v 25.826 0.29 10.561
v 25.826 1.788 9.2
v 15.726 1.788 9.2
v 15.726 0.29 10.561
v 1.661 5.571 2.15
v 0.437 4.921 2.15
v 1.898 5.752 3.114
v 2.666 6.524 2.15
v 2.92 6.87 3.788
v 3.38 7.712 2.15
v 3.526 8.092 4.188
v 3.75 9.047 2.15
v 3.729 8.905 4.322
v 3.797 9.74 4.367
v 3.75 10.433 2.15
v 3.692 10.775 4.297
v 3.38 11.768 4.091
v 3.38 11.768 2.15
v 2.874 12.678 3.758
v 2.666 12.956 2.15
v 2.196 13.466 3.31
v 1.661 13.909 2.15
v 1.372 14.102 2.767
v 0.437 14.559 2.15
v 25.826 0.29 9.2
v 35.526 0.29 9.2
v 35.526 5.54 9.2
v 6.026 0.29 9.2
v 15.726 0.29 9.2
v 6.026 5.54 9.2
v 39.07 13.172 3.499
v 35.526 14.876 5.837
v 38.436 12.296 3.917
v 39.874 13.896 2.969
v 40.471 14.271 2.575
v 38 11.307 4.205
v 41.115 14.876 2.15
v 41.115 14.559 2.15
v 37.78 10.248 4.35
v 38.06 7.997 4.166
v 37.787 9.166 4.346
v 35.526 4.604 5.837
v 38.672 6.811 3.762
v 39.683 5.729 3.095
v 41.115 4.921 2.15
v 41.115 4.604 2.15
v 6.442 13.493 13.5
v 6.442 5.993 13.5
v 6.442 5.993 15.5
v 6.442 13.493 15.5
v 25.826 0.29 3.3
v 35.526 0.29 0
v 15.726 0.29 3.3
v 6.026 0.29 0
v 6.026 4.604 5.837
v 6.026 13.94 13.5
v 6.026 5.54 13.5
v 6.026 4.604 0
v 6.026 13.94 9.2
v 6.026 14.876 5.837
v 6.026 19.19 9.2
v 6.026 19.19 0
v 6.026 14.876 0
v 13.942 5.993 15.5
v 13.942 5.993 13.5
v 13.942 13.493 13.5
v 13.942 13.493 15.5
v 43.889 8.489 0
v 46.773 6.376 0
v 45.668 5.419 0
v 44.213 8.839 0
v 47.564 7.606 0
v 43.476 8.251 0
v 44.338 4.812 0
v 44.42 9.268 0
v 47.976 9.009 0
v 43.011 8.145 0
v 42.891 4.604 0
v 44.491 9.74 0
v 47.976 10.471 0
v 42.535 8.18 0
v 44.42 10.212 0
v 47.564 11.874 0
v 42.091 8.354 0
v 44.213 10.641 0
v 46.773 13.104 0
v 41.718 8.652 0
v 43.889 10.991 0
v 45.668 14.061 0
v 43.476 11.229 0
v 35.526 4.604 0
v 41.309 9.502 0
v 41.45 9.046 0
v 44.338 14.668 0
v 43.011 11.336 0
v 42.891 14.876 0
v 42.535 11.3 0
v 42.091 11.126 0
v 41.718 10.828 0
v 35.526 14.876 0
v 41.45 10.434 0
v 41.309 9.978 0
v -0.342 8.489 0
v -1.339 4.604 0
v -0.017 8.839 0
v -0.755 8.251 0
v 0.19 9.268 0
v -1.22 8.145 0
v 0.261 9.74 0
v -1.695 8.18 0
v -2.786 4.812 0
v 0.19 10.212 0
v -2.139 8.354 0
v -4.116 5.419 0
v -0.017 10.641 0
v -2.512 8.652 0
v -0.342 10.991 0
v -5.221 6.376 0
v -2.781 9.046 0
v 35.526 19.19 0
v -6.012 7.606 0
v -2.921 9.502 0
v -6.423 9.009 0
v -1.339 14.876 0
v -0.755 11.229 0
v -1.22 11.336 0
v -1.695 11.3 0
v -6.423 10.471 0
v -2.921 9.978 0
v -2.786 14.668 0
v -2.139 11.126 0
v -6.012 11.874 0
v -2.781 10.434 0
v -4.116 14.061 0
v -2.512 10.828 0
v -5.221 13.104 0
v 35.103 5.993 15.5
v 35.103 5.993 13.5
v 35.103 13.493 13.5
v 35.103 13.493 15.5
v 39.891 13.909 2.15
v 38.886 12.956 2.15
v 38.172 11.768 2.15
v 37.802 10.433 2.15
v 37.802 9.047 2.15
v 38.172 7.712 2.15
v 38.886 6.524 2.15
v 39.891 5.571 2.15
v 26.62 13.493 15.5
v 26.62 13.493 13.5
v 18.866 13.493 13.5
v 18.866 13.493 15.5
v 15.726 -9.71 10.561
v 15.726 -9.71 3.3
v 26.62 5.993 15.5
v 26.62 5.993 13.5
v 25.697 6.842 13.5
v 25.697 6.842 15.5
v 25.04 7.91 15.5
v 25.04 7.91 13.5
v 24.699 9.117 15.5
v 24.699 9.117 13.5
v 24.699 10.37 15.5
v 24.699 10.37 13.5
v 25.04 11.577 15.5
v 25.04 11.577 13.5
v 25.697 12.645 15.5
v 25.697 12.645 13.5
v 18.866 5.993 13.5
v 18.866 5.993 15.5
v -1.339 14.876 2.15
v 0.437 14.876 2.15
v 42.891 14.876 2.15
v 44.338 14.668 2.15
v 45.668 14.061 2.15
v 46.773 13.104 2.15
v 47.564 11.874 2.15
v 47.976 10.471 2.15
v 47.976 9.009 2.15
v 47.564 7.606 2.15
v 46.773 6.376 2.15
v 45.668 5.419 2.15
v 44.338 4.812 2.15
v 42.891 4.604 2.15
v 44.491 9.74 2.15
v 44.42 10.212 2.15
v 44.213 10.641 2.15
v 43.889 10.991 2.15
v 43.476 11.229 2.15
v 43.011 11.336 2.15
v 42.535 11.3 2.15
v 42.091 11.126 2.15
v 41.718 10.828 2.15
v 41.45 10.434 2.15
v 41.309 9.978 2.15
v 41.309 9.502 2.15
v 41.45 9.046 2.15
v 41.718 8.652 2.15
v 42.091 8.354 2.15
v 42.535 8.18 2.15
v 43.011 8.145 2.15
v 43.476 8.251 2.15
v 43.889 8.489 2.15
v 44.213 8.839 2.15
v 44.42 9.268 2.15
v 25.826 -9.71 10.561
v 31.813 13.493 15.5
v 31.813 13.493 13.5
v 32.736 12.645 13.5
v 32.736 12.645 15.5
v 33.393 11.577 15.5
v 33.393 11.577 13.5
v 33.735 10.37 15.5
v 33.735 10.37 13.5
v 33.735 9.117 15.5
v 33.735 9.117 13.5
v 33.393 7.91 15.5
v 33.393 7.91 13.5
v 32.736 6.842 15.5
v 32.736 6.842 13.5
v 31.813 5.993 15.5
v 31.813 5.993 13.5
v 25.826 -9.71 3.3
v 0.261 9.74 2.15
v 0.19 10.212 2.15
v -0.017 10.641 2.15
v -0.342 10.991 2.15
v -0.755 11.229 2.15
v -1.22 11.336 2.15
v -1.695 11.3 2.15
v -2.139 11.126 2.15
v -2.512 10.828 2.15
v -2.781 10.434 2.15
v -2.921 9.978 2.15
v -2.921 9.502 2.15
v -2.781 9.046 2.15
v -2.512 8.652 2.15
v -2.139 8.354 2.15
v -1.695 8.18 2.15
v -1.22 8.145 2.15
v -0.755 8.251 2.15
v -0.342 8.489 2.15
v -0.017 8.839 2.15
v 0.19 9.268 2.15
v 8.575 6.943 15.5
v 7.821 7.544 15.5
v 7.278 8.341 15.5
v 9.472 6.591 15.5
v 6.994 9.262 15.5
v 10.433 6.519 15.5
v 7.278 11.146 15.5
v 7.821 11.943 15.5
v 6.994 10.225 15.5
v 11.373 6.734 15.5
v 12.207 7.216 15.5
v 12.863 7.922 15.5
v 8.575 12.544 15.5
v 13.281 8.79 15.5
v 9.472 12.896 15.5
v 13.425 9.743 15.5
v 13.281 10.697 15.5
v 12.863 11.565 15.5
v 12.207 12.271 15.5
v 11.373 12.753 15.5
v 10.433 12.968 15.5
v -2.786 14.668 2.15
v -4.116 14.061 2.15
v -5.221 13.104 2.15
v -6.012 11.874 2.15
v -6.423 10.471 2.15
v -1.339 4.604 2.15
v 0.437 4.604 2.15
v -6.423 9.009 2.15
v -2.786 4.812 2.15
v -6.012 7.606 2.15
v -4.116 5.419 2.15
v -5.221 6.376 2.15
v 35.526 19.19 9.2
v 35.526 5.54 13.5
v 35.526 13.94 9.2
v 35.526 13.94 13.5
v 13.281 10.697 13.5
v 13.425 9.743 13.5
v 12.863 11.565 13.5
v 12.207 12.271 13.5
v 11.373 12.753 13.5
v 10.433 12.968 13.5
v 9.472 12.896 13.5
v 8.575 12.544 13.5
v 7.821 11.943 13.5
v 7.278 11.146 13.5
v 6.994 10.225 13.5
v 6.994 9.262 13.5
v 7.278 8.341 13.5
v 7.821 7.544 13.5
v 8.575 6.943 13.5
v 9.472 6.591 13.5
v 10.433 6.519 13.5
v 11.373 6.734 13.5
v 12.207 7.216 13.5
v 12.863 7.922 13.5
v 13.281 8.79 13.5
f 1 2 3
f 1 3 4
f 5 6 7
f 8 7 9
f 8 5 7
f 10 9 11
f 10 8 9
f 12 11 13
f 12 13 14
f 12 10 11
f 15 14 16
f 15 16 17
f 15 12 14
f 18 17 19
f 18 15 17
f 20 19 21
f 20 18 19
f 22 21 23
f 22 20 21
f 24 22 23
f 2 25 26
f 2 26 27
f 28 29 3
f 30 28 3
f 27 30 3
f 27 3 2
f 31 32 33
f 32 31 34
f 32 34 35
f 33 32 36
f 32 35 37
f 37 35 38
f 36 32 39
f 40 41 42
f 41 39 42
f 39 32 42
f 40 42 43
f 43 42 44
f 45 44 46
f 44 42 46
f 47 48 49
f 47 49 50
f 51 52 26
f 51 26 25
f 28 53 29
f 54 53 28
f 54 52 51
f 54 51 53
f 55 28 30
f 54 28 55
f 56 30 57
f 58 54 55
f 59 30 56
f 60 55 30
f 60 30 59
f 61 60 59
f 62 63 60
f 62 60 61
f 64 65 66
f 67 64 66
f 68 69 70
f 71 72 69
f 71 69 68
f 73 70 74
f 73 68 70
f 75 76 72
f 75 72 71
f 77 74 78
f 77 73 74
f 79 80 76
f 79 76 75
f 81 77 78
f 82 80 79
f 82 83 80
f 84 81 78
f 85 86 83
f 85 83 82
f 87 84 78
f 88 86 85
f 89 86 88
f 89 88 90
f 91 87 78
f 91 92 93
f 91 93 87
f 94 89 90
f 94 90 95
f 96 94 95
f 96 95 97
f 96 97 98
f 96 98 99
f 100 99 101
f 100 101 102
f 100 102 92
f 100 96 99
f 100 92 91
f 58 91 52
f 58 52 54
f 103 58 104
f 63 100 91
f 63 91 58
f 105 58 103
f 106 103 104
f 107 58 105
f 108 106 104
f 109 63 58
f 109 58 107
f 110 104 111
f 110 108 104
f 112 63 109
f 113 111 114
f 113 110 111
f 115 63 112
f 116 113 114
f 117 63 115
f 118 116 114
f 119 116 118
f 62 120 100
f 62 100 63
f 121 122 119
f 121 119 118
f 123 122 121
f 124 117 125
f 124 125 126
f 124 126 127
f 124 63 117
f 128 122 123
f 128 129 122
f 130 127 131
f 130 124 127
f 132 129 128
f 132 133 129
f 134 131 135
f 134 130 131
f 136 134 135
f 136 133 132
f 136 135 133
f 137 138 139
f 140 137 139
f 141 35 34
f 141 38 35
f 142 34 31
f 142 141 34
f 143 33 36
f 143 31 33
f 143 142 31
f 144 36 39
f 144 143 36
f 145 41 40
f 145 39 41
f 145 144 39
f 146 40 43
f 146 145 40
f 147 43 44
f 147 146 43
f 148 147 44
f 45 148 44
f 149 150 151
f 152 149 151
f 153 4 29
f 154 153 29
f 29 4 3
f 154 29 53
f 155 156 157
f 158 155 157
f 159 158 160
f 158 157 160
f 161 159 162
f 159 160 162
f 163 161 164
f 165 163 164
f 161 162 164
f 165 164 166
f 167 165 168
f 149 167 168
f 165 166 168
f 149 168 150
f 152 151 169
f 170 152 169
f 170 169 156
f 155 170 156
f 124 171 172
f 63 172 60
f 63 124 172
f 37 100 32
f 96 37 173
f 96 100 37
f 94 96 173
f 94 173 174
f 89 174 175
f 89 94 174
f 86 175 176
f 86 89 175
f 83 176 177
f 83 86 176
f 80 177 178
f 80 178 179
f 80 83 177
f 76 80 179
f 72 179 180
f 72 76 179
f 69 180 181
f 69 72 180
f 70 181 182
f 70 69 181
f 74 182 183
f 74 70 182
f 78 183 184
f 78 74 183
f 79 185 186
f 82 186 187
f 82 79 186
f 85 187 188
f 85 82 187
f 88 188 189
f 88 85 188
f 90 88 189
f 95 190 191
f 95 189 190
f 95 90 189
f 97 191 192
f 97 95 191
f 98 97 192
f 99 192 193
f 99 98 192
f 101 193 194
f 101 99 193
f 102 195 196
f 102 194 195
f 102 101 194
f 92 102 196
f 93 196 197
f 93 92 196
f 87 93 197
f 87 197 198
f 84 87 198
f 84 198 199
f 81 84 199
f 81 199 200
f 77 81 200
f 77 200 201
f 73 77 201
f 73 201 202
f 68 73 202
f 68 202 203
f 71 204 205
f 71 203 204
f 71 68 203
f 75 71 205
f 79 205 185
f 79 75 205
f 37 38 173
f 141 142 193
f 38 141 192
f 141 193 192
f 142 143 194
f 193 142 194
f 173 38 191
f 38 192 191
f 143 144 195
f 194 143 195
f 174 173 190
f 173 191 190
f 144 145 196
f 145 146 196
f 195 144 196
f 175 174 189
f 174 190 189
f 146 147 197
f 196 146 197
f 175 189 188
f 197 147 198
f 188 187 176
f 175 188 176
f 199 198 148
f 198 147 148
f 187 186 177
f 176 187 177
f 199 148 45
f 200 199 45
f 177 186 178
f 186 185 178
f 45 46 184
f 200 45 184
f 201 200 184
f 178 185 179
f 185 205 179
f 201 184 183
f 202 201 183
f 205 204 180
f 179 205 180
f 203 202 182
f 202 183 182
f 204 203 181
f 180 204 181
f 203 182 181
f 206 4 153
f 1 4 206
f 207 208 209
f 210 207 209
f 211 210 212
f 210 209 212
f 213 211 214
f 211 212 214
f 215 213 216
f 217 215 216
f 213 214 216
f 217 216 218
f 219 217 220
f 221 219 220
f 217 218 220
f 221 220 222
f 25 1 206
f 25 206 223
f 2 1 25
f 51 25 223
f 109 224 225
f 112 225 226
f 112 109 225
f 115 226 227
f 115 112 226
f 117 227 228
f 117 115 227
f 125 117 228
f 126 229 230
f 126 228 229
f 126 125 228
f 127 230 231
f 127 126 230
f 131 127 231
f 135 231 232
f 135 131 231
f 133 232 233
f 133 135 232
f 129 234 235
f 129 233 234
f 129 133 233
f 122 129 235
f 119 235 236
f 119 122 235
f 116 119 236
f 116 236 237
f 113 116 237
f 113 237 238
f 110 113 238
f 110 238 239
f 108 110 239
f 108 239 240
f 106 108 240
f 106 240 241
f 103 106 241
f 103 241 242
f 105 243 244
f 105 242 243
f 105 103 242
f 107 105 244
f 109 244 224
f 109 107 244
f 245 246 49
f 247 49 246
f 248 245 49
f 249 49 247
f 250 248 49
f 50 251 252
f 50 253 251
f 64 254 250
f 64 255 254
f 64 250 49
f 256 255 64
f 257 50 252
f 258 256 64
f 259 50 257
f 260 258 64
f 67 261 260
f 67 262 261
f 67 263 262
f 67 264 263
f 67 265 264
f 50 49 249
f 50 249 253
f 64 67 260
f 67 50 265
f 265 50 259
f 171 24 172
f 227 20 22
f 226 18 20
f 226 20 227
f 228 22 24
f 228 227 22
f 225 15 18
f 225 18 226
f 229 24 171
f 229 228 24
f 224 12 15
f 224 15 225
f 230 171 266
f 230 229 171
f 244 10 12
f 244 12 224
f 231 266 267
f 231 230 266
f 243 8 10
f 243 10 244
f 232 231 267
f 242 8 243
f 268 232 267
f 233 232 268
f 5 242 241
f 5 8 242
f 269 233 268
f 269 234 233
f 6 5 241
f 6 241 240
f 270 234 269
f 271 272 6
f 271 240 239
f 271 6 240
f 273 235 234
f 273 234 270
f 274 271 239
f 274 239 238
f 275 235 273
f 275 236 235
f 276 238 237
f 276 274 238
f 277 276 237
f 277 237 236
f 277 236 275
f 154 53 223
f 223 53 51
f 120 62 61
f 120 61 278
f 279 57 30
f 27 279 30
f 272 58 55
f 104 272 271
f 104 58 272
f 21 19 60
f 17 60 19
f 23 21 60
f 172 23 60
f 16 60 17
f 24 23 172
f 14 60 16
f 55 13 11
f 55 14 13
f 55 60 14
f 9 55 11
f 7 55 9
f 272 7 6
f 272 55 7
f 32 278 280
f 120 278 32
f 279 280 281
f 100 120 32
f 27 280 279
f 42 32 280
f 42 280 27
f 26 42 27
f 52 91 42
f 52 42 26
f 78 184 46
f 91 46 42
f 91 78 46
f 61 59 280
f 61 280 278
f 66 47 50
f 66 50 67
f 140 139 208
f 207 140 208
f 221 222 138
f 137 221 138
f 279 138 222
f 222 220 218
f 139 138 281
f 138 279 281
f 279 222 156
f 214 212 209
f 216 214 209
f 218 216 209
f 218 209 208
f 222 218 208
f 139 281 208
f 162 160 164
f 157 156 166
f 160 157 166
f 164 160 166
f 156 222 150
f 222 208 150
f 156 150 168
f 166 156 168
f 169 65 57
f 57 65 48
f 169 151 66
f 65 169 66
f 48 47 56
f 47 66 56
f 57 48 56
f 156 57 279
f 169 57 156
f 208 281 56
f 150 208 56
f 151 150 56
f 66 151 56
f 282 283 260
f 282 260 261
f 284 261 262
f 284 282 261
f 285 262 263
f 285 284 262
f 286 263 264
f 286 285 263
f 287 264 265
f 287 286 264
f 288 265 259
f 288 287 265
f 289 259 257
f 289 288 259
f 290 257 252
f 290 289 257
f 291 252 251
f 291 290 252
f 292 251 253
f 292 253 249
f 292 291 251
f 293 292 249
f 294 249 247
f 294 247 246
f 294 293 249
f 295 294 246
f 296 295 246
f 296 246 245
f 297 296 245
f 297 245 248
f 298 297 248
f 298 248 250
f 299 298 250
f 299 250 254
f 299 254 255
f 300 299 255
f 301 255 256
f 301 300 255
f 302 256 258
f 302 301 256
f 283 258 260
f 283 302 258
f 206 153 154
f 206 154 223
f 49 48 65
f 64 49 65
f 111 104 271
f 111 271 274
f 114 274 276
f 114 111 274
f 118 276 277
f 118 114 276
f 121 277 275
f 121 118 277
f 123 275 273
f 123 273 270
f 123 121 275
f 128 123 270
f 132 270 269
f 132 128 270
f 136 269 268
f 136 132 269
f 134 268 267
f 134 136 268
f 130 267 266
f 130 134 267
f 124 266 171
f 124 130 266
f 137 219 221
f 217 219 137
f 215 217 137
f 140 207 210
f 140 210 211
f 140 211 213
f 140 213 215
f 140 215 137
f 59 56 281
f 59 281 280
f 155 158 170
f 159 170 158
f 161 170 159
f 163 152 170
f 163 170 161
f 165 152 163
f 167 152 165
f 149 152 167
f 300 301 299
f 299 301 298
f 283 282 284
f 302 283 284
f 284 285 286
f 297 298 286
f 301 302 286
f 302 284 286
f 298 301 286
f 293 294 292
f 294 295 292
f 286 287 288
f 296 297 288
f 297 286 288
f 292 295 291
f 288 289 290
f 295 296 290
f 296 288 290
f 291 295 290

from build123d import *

# Parameters (mm, degrees)
SKETCH1_R           = 1.6
BOSS_EXTRUDE1_DEPTH = 13.5
CUT_EXTRUDE2_DEPTH  = 54.452572483
SKETCH3_W           = 4.3
SKETCH3_H           = 5.25
CUT_EXTRUDE4_DEPTH  = 54.452572483
SKETCH4_W           = 7.5
SKETCH4_H           = 7.5
SKETCH4_R           = 3.233378309
BOSS_EXTRUDE2_DEPTH = 2
CUT_EXTRUDE6_START  = -7.05
SKETCH5_R           = 5.136449747
CUT_EXTRUDE6_DEPTH  = 7.05
SKETCH6_W           = 10.1
SKETCH6_H           = 7.260831794
BOSS_EXTRUDE3_DEPTH = 10
BOSS_EXTRUDE4_DEPTH = 10.1


with BuildPart() as part:
    # Sketch1 → Boss-Extrude1 (new body)
    with BuildSketch(Plane.XY):
        with BuildLine():
            Line((6.026068185, 19.19002712), (35.526068185, 19.19002712))
            Line((35.526068185, 19.19002712), (35.526068185, 14.876476867))
            Line((35.526068185, 14.876476867), (42.891358492, 14.876476867))
            ThreePointArc((42.891358492, 14.876476867), (48.027808239, 9.74002712), (42.891358492, 4.603577373))
            Line((42.891358492, 4.603577373), (35.526068185, 4.603577373))
            Line((35.526068185, 4.603577373), (35.526068185, 0.29002712))
            Line((35.526068185, 0.29002712), (6.026068185, 0.29002712))
            Line((6.026068185, 0.29002712), (6.026068185, 4.603577373))
            Line((6.026068185, 4.603577373), (-1.339222121, 4.603577373))
            ThreePointArc((-1.339222121, 4.603577373), (-6.475671868, 9.74002712), (-1.339222121, 14.876476867))
            Line((-1.339222121, 14.876476867), (6.026068185, 14.876476867))
            Line((6.026068185, 14.876476867), (6.026068185, 19.19002712))
        make_face()
        with Locations((-1.339222121, 9.74002712)):
            Circle(SKETCH1_R, mode=Mode.SUBTRACT)
        with Locations((42.891358492, 9.74002712)):
            Circle(SKETCH1_R, mode=Mode.SUBTRACT)
    extrude(amount=BOSS_EXTRUDE1_DEPTH)

    # Sketch2 → Cut-Extrude2 (cut, through all)
    with BuildSketch(Plane(origin=(0, 0, 0), x_dir=(1, 0, 0), z_dir=(0, 1, 0))):
        Polygon((-6.475671868, -2.15), (-6.475671868, 0), (-10.044911126, 0), (-10.044911126, -17.049735049), (6.026068185, -17.049735049), (6.026068185, -5.837365249), (0.437350873, -2.15), align=None)
        Polygon((48.027808239, 0), (51.597047497, 0), (51.597047497, -17.049735049), (35.526068185, -17.049735049), (35.526068185, -5.837365249), (41.114785497, -2.15), (48.027808239, -2.15), align=None)
    extrude(amount=CUT_EXTRUDE2_DEPTH, mode=Mode.SUBTRACT)

    # Sketch3 → Cut-Extrude4 (cut, through all)
    with BuildSketch(Plane(origin=(0, 0, 0), x_dir=(0, 0, -1), z_dir=(1, 0, 0))):
        with Locations((-11.35, 16.56502712)):
            Rectangle(SKETCH3_W, SKETCH3_H)
        with Locations((-11.35, 2.91502712)):
            Rectangle(SKETCH3_W, SKETCH3_H)
    extrude(amount=CUT_EXTRUDE4_DEPTH, mode=Mode.SUBTRACT)

    # Sketch4 → Boss-Extrude2 (add)
    # profile 1 of 3: a face of its own
    with BuildSketch(Plane.XY.offset(13.5)):
        with Locations((10.1915125, 9.743497044)):
            Rectangle(SKETCH4_W, SKETCH4_H)
        with Locations((10.1915125, 9.743497044)):
            Circle(SKETCH4_R, mode=Mode.SUBTRACT)
    # profile 2 of 3: a face of its own
    with BuildSketch(Plane.XY.offset(13.5)):
        with BuildLine():
            Line((35.102590636, 13.493497044), (31.813216882, 13.493497044))
            ThreePointArc((31.813216882, 13.493497044), (33.77792813, 9.743497044), (31.813216882, 5.993497044))
            Line((31.813216882, 5.993497044), (35.102590636, 5.993497044))
            Line((35.102590636, 5.993497044), (35.102590636, 13.493497044))
        make_face()
    # profile 3 of 3: a face of its own
    with BuildSketch(Plane.XY.offset(13.5)):
        with BuildLine():
            Line((18.865933267, 13.493497044), (18.865933267, 5.993497044))
            Line((18.865933267, 5.993497044), (26.620387797, 5.993497044))
            ThreePointArc((26.620387797, 5.993497044), (24.655676549, 9.743497044), (26.620387797, 13.493497044))
            Line((26.620387797, 13.493497044), (18.865933267, 13.493497044))
        make_face()
    extrude(amount=BOSS_EXTRUDE2_DEPTH)

    # Sketch5 → Cut-Extrude6 (cut)
    with BuildSketch(Plane.XY.offset(9.2).offset(CUT_EXTRUDE6_START)):
        with Locations((-1.339222121, 9.74002712)):
            Circle(SKETCH5_R)
        with Locations((42.891358492, 9.74002712)):
            Circle(SKETCH5_R)
    extrude(amount=CUT_EXTRUDE6_DEPTH, mode=Mode.SUBTRACT)

    # Sketch6 → Boss-Extrude3 (add)
    with BuildSketch(Plane.XZ.offset(-0.29002712)):
        with Locations((20.776068185, 6.930415897)):
            Rectangle(SKETCH6_W, SKETCH6_H)
    extrude(amount=BOSS_EXTRUDE3_DEPTH)

    # Sketch7 → Boss-Extrude4 (add)
    with BuildSketch(Plane(origin=(25.826068185, 0, 0), x_dir=(0, 0, -1), z_dir=(1, 0, 0))):
        Polygon((-10.560831794, 0.29002712), (-9.2, 0.29002712), (-9.2, 1.787728589), align=None)
    extrude(amount=-BOSS_EXTRUDE4_DEPTH)


solid = part.part
